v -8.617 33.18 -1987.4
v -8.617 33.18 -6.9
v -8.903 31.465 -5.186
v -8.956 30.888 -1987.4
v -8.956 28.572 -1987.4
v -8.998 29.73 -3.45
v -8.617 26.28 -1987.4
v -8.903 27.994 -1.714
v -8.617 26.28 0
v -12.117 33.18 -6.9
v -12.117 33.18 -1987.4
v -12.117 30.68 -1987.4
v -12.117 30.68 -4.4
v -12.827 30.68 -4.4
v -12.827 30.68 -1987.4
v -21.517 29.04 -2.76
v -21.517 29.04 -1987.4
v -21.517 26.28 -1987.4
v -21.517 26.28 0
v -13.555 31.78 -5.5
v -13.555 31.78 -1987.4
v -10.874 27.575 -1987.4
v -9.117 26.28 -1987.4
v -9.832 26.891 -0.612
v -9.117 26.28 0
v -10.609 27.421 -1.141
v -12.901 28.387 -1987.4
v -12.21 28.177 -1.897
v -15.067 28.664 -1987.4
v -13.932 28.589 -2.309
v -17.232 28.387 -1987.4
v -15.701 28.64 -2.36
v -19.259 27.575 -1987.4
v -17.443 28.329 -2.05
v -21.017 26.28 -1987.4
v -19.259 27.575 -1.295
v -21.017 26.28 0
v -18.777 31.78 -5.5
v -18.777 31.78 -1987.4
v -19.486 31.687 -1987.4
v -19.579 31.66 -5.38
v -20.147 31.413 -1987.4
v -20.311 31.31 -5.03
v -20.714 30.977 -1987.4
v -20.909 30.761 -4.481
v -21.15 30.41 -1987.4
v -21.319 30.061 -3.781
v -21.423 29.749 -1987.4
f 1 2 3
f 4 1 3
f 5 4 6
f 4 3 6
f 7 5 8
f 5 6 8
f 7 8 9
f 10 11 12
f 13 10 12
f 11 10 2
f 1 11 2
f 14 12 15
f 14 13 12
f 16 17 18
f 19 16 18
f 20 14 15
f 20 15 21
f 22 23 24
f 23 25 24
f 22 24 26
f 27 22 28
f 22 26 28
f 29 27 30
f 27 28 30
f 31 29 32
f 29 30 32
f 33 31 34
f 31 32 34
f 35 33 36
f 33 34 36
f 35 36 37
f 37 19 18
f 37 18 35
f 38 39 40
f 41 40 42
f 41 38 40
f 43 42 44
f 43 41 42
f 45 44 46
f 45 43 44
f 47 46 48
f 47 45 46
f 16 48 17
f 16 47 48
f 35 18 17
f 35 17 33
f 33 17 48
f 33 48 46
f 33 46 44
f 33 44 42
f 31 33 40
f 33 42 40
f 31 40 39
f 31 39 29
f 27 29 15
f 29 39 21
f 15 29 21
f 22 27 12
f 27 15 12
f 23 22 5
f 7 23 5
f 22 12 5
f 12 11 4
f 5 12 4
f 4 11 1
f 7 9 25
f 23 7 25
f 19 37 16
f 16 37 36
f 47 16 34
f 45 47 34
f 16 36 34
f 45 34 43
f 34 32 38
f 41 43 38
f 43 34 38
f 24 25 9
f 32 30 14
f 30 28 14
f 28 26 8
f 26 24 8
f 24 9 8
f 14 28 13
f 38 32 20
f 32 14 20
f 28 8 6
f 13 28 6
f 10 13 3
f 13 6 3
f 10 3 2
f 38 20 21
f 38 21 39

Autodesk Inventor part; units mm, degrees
ref_plane "YZ Plane" through (0, 0, 0) normal (1, 0, 0) x (0, 1, 0)
sketch "Boceto1" plane through (0, 0, 0) normal (0, 0, 1) x (1, 0, 0)
  line L0 (-13.5546, 31.7799) -> (-18.7766, 31.7799)
  line L1 (-12.1166, 33.1799) -> (-12.1166, 30.6799)
  line L2 (-12.1166, 30.6799) -> (-12.8266, 30.6799)
  line L3 (-12.8266, 30.6799) -> (-13.5546, 31.7799)
  arc A0 (-18.7766, 31.7799) -> (-21.5166, 29.0399) centre (-18.7766, 29.0399) ccw
  line L4 (-12.1166, 33.1799) -> (-8.6166, 33.1799)
  line L5 (-21.5166, 29.0399) -> (-21.5166, 26.2799)
  arc A1 (-8.6166, 33.1799) -> (-8.6166, 26.2799) centre (6.7872, 29.7299) ccw
  line L6 (-21.5166, 26.2799) -> (-21.0166, 26.2799)
  line L7 (-8.6166, 26.2799) -> (-9.1166, 26.2799)
  line L8 (-8.6166, 38.7215) -> (-8.6166, 22.0906) construction
  arc A2 (-9.1166, 26.2799) -> (-21.0166, 26.2799) centre (-15.0666, 20.0463) ccw
  dimension "d218" = 2.5
  dimension "d219" = 0.71
  dimension "d221" = 33.5
  dimension "d223" = 2.74
  dimension "d281" = 3.5
  dimension "d288" = 2.76
  dimension "d291" = 0.5
  dimension "d292" = 0.5
  dimension "d301" = 5.2219
extrude "Extrusión1" add sketch "Boceto1" against normal blind 1987.4
ref_plane "Plano de trabajo1" through (-8.6166, 33.1799, 0) normal (-1, 0, 0) x (0, 0, -1)
ref_plane "Plano de trabajo2" through (0, 0, -993.7) normal (0, 0, 1) x (1, 0, 0)
sketch "Boceto2" plane through (-8.6166, 33.1799, 0) normal (-1, 0, 0) x (0, 0, -1)
  line L0 (0, 0) -> (0, 6.9) projected
  line L1 (0, 0) -> (1987.4, 0) projected
  line L2 (6.9, 0) -> (0, 0)
  line L3 (0, 0) -> (0, 6.9)
  line L4 (0, 6.9) -> (1987.4, 6.9) projected
  line L5 (0, 6.9) -> (6.9, 0)
  point P0 (0, 0)
  dimension "d300" = 45
extrude "Extrusión2" cut sketch "Boceto2" along normal through all
properties part number "SP40-02 JUNTA INT CRISTAL 1987ç mm" material "Caucho"
